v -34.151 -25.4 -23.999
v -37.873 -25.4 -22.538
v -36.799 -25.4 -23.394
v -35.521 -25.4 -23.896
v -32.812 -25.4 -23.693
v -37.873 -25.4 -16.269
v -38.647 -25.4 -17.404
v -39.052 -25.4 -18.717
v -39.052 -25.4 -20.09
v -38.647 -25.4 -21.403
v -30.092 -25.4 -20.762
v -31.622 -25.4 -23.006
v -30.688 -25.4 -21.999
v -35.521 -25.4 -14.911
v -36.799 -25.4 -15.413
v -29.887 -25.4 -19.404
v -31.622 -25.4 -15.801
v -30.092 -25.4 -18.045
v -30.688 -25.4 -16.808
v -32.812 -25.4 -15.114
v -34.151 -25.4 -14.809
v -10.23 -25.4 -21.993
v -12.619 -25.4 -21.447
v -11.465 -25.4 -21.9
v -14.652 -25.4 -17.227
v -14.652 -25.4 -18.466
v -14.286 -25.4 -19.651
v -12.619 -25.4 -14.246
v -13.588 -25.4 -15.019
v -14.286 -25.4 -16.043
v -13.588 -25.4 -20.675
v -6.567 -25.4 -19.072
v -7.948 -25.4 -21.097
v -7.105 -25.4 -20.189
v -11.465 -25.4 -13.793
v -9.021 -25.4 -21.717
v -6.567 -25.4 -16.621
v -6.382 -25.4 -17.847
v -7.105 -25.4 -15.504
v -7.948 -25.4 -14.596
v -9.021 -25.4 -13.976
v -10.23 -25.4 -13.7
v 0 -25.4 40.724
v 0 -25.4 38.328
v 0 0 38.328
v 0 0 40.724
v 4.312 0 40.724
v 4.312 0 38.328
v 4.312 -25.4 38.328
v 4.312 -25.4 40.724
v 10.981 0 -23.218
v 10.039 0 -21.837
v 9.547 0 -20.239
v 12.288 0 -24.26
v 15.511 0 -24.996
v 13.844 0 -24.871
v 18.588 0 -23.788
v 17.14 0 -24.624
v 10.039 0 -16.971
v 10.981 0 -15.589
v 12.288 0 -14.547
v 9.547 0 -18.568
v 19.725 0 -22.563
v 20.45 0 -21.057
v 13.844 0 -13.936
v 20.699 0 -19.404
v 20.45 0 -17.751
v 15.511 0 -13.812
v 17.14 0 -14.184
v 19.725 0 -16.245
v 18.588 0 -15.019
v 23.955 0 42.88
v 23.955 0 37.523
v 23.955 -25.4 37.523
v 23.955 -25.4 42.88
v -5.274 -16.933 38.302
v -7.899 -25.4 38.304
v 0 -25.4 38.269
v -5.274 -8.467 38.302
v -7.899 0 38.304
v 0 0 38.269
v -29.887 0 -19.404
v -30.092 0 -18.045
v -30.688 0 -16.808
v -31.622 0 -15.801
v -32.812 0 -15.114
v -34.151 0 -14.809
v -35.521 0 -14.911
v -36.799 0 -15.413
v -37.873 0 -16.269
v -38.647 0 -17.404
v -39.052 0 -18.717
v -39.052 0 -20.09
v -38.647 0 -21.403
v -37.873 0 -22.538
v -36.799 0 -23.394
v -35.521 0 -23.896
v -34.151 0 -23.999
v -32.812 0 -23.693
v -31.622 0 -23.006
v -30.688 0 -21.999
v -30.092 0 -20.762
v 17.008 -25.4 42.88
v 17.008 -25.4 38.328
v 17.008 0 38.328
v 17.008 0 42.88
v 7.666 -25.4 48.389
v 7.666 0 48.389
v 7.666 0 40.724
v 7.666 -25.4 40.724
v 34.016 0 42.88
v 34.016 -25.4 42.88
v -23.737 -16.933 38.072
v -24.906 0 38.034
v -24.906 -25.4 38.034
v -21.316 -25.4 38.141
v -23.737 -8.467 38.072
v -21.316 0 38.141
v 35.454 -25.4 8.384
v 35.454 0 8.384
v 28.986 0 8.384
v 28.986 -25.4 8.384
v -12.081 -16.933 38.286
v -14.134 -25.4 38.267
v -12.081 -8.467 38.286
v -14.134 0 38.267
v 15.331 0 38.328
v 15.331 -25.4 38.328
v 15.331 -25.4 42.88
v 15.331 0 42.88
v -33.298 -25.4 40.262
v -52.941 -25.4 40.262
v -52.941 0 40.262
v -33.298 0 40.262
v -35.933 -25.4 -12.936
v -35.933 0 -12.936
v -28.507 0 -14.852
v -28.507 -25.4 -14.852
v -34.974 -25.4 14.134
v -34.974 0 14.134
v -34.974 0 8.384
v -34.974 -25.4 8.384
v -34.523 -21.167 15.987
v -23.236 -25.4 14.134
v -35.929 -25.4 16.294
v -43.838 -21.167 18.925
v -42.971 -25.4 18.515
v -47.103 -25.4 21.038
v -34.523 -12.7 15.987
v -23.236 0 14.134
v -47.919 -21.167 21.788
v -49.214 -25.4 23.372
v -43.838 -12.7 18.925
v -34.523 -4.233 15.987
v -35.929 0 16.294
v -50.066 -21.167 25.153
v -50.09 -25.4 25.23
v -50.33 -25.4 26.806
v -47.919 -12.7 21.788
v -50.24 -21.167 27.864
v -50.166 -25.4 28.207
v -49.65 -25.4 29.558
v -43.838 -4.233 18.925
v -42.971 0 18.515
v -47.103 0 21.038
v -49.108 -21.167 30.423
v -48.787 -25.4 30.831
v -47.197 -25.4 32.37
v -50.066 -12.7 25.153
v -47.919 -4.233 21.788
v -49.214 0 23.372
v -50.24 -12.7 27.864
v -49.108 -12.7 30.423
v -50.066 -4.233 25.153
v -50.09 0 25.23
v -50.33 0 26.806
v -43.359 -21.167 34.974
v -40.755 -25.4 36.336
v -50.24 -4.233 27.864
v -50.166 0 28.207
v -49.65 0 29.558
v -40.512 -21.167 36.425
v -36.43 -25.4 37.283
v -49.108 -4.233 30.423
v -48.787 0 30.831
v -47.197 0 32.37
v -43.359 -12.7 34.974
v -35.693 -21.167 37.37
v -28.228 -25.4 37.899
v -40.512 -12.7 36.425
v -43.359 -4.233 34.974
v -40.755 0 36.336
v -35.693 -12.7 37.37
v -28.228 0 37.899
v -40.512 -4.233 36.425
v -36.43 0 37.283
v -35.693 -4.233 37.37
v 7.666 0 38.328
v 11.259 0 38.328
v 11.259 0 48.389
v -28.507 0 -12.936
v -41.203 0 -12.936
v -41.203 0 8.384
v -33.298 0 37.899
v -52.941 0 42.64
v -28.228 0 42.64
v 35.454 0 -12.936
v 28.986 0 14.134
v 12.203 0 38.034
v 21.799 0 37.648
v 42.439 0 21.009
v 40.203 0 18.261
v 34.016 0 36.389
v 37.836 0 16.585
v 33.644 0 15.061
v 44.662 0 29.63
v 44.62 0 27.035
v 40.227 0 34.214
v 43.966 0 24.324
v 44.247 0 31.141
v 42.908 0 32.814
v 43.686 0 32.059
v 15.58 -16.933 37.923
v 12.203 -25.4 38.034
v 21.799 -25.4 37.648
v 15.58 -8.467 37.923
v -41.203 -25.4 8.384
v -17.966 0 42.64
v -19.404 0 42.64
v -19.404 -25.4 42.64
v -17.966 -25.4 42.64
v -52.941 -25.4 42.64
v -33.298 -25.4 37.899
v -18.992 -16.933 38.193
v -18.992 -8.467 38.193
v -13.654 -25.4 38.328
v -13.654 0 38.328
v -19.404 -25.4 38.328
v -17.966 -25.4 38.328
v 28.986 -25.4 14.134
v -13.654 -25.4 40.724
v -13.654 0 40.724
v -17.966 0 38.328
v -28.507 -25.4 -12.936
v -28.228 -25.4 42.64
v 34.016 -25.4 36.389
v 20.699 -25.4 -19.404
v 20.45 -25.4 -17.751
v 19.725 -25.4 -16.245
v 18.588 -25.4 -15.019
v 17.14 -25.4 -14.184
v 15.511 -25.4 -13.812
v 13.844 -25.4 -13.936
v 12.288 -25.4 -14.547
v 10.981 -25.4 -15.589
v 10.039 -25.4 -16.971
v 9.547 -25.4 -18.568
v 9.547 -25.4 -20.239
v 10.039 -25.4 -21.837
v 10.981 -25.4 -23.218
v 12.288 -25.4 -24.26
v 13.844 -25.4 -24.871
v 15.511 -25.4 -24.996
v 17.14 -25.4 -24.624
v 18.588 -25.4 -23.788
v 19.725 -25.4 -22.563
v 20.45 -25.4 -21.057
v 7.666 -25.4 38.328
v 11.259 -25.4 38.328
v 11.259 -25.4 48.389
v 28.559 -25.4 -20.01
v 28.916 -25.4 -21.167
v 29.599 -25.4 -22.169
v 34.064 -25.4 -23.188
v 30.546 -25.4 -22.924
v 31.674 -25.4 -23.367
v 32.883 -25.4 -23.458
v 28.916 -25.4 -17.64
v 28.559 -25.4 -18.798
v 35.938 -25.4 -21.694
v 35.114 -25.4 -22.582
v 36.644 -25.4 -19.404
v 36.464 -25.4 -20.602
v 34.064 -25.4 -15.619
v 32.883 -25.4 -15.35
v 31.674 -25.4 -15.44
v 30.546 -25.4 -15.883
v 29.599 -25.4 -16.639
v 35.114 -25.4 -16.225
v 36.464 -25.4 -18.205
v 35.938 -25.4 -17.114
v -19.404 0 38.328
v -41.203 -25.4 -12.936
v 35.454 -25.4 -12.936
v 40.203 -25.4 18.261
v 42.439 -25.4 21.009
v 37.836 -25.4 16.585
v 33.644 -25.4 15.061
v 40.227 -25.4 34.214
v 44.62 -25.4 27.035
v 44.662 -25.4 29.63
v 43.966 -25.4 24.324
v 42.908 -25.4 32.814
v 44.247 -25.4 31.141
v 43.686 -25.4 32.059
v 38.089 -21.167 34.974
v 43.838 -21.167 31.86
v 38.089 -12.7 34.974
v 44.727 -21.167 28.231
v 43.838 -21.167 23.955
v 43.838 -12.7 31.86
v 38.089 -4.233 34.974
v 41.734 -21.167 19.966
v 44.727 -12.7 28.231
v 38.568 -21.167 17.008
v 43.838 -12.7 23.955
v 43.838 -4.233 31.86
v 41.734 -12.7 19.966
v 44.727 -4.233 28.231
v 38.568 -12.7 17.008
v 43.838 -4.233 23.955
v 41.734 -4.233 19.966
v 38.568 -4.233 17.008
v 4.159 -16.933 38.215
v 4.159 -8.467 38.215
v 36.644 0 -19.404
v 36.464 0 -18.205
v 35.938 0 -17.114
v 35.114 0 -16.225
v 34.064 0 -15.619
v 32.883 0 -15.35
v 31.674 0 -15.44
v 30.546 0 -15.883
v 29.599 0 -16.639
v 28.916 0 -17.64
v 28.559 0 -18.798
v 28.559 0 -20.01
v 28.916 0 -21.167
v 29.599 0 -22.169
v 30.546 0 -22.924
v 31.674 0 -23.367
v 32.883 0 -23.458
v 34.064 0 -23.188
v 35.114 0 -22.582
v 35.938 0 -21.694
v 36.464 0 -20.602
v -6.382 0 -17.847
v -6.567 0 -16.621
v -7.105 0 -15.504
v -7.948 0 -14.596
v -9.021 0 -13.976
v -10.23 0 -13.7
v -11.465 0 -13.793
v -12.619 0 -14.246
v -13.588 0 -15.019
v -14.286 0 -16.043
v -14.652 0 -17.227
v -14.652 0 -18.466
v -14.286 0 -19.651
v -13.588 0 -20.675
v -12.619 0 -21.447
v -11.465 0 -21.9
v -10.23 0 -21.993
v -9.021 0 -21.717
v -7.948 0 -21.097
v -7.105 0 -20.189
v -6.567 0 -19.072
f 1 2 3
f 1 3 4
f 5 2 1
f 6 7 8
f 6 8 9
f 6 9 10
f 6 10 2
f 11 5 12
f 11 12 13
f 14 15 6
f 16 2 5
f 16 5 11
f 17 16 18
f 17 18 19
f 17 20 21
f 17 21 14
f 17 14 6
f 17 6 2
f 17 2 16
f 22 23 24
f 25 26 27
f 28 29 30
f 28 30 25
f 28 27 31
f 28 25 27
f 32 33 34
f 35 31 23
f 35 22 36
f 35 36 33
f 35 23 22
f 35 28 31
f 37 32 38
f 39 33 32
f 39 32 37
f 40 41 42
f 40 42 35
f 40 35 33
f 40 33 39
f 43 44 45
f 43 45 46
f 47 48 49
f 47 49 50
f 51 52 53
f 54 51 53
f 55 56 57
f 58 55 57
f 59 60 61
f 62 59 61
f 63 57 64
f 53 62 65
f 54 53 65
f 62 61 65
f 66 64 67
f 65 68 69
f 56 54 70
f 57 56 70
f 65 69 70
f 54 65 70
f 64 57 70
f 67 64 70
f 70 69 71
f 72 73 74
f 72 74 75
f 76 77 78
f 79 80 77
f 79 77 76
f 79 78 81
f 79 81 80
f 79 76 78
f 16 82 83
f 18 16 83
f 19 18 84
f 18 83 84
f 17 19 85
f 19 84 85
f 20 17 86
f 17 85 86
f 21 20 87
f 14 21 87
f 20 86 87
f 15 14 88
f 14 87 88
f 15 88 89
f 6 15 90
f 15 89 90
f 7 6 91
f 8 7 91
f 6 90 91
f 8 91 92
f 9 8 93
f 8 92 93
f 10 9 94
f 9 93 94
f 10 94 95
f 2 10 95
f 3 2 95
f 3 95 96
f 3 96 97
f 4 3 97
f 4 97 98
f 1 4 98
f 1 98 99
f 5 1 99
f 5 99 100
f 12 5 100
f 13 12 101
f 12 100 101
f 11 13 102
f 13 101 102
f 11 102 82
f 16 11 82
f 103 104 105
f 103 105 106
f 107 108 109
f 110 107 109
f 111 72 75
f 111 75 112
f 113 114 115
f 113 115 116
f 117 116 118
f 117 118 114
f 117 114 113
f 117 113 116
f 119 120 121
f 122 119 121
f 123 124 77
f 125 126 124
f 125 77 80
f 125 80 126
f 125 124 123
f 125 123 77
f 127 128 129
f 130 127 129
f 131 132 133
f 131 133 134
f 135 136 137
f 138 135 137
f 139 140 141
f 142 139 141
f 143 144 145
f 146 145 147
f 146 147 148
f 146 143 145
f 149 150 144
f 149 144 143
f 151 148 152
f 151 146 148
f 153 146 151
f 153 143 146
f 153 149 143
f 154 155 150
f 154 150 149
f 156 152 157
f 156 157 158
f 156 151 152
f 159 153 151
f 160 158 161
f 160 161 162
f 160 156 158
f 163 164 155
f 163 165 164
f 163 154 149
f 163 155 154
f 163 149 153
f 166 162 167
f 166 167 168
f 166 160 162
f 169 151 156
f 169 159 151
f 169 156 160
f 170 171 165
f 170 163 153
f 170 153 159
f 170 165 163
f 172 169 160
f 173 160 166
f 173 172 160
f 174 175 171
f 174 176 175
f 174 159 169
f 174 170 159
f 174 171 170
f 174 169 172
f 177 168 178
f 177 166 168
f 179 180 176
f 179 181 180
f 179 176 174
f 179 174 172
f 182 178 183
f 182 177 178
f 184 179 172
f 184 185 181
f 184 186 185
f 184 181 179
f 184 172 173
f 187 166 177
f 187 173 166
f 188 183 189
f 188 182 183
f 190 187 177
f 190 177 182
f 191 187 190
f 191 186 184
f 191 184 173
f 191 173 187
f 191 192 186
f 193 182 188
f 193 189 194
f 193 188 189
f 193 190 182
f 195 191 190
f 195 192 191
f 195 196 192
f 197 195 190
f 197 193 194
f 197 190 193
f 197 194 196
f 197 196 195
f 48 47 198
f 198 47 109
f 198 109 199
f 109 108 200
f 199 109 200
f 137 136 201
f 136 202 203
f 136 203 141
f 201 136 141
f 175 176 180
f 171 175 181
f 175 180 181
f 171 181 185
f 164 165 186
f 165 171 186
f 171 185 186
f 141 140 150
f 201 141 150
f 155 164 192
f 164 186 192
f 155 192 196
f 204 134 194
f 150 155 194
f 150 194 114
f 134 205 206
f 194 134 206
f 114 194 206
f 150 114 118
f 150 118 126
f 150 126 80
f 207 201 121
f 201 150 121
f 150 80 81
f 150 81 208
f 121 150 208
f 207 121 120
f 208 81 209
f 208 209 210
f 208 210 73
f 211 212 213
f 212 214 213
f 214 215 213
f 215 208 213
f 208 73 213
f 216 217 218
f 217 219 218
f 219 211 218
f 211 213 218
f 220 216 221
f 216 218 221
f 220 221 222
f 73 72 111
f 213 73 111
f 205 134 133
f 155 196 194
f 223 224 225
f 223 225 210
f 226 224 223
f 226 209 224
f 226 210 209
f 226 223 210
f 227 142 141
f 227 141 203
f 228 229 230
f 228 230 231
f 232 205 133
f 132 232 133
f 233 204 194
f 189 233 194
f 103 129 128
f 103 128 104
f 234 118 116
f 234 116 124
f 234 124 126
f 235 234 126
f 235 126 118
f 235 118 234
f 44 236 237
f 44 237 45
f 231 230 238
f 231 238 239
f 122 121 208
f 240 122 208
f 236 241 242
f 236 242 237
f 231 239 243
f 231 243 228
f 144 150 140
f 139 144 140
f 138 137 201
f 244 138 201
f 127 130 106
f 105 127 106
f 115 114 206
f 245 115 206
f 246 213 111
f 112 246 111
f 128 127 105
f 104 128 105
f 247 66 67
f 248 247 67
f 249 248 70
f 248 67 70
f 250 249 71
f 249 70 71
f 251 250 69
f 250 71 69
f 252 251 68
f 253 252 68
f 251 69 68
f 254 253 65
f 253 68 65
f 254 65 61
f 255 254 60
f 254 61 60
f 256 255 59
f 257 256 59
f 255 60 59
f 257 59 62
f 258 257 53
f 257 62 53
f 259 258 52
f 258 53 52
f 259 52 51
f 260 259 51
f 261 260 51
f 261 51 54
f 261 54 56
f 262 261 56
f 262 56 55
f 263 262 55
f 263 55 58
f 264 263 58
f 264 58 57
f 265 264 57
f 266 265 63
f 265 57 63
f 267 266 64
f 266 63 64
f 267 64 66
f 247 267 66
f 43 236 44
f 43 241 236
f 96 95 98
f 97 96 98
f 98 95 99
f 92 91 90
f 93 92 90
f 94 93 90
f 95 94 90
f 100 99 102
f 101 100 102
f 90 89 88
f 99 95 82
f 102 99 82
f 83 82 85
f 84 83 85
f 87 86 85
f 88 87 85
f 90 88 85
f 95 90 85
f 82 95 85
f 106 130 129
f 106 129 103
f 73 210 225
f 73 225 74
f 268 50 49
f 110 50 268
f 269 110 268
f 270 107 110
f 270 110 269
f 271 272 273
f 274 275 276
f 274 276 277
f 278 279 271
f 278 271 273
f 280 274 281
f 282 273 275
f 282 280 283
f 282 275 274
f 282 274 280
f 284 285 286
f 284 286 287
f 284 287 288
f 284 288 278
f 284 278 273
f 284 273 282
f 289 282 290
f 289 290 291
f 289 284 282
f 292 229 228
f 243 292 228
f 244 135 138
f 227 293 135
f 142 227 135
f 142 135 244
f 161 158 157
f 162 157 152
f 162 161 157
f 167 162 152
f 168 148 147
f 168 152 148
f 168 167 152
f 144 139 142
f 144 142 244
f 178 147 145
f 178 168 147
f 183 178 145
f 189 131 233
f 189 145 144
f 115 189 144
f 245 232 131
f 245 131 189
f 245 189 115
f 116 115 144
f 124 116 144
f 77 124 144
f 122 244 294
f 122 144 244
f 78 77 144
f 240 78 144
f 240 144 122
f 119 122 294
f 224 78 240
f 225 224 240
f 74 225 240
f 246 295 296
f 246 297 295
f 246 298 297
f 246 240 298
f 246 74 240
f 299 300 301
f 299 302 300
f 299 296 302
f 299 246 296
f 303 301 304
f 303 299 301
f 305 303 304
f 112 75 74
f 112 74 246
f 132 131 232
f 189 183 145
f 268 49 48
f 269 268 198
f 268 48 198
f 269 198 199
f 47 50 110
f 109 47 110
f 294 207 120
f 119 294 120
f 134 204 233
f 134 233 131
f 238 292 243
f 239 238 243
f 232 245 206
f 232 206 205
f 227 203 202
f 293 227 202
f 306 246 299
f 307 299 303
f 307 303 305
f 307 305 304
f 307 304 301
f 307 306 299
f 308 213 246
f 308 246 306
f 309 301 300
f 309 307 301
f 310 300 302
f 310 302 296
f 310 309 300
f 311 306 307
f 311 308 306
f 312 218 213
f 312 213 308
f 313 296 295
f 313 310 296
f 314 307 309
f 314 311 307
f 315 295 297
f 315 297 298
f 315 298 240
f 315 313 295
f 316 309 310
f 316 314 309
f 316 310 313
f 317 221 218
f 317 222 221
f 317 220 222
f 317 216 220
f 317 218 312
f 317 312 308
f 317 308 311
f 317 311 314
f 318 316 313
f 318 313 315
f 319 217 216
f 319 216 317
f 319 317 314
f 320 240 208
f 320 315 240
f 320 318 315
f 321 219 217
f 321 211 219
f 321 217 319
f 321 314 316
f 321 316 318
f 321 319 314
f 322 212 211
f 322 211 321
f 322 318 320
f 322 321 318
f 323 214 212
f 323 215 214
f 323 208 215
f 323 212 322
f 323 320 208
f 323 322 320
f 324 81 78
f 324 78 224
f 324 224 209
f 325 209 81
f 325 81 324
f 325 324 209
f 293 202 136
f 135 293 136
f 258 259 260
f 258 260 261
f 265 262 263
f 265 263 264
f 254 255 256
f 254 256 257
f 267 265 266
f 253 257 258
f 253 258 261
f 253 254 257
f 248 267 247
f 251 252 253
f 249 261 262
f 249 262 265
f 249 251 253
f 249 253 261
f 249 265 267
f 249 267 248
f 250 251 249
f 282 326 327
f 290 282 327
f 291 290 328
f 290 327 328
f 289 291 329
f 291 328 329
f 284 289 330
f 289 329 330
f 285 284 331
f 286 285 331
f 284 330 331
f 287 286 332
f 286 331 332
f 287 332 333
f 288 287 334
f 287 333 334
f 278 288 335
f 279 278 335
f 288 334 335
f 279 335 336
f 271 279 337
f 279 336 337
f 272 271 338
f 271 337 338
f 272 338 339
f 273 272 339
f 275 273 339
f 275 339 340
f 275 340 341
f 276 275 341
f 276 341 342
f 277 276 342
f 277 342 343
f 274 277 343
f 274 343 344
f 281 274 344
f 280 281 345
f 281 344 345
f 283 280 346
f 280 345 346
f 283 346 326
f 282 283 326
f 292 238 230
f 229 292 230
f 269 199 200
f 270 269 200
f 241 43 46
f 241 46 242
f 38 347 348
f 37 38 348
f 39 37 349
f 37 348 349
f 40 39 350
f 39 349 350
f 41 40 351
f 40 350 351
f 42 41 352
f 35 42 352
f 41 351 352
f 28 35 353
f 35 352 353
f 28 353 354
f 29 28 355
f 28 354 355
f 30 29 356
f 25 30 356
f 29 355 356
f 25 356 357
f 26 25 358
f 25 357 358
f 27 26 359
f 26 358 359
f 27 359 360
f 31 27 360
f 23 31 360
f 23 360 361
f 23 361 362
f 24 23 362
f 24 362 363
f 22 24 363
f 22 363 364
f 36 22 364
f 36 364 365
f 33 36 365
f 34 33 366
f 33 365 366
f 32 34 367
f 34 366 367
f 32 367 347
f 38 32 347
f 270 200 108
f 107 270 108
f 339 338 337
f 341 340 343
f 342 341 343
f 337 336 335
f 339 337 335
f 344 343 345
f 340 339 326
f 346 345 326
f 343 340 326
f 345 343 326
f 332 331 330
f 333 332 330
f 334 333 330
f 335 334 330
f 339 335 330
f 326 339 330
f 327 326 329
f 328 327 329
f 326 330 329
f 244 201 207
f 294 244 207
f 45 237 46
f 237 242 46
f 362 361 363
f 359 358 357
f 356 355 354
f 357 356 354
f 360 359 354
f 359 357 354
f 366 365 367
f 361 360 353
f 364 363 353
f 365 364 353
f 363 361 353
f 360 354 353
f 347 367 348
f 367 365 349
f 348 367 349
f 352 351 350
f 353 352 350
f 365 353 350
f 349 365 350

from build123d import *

# Parameters (mm, degrees)
F0_W     = 5.0702048653
F0_H     = 2.3622762329
F1_DEPTH = 25.4
F0_R     = 4.6078543136
F0_R_2   = 4.1577773218
F0_R_3   = 5.6077425758
F0_R_4   = 4.0653177371
F3_DEPTH = 25.4
F2_W     = 1.4373064041
F2_H     = 4.3119154871
F2_W_2   = 3.3537149429
F2_H_2   = 2.3955106735
F2_W_3   = 10.0611355156
F2_H_3   = 6.7074261606
F2_W_4   = 1.6768574715
F2_H_4   = 4.5514665544


with BuildPart() as f1:
    # F0 (on Front) → F1 (new body)
    with BuildSketch(Plane.XZ):
        Polygon((28.9856605232, -12.9357483238), (35.4535356164, -12.9357483238), (35.4535356164, 8.3842817694), (28.9856605232, 8.3842817694), (-34.9744297564, 8.3842817694), (-41.2027537823, 8.3842817694), (-41.2027537823, -12.9357483238), (-35.9326340258, -12.9357483238), (-28.5065565258, -12.9357483238), (-14.6126048639, -12.9357483238), (-6.4678736962, -12.9357483238), (9.8215863109, -12.9357483238), (19.4036252797, -12.9357483238), align=None)
        Polygon((-34.9744297564, 8.3842817694), (28.9856605232, 8.3842817694), (28.9856605232, 14.1335036606), (-23.2364367694, 14.1335036606), (-34.9744297564, 14.1335036606), align=None)
        with BuildLine():
            Line((-23.2364367694, 14.1335036606), (28.9856605232, 14.1335036606))
            add(Edge.make_bspline(
                [(21.7991303653, 37.6480714586), (25.6450727863, 37.4416232789), (34.6809133054, 36.7330473424), (37.0927539509, 35.0331252242), (45.5422763301, 32.8451114125), (44.452312866, 23.3823811536), (39.1621048566, 15.9129440703), (32.4545711571, 14.7400730632), (28.9856605232, 14.1335036606)],
                knots=[0.585293099, 0.585293099, 0.585293099, 0.585293099, 0.6248367621, 0.6959160319, 0.7636209053, 0.8380663016, 0.9162533423, 1, 1, 1, 1], degree=3))
            add(Edge.make_bspline(
                [(12.2025949201, 38.0339011156), (15.6521480295, 37.9326505565), (18.9005752843, 37.803664381), (21.7991303653, 37.6480714586)],
                knots=[0.5554903944, 0.5554903944, 0.5554903944, 0.5554903944, 0.585293099, 0.585293099, 0.585293099, 0.585293099], degree=3))
            add(Edge.make_bspline(
                [(0, 38.2687912792), (4.1809466223, 38.2267187557), (8.3192182558, 38.1478851726), (12.2025949201, 38.0339011156)],
                knots=[0.5219396348, 0.5219396348, 0.5219396348, 0.5219396348, 0.5554903944, 0.5554903944, 0.5554903944, 0.5554903944], degree=3))
            add(Edge.make_bspline(
                [(-7.8992090494, 38.3041348545), (-5.2845734446, 38.3072105896), (-2.6338190113, 38.2952951843), (0, 38.2687912792)],
                knots=[0.5008040794, 0.5008040794, 0.5008040794, 0.5008040794, 0.5219396348, 0.5219396348, 0.5219396348, 0.5219396348], degree=3))
            add(Edge.make_bspline(
                [(-14.1335027292, 38.2671583871), (-12.0975615779, 38.289396776), (-10.0101569366, 38.3016516341), (-7.8992090494, 38.3041348545)],
                knots=[0.4837401124, 0.4837401124, 0.4837401124, 0.4837401124, 0.5008040794, 0.5008040794, 0.5008040794, 0.5008040794], degree=3))
            add(Edge.make_bspline(
                [(-21.316305856, 38.1405074727), (-19.0328736954, 38.1978928782), (-16.621619078, 38.2399809321), (-14.1335027292, 38.2671583871)],
                knots=[0.4628862997, 0.4628862997, 0.4628862997, 0.4628862997, 0.4837401124, 0.4837401124, 0.4837401124, 0.4837401124], degree=3))
            add(Edge.make_bspline(
                [(-24.9057131658, 38.0337493601), (-23.7521320973, 38.0738631863), (-22.5529646355, 38.1094287454), (-21.316305856, 38.1405074727)],
                knots=[0.4515923138, 0.4515923138, 0.4515923138, 0.4515923138, 0.4628862997, 0.4628862997, 0.4628862997, 0.4628862997], degree=3))
            add(Edge.make_bspline(
                [(-28.228171762, 37.8993945294), (-27.1718919643, 37.9487878685), (-26.0616905562, 37.9935522058), (-24.9057131658, 38.0337493601)],
                knots=[0.4402748671, 0.4402748671, 0.4402748671, 0.4402748671, 0.4515923138, 0.4515923138, 0.4515923138, 0.4515923138], degree=3))
            add(Edge.make_bspline(
                [(-23.2364367694, 14.1335036606), (-30.9795679414, 15.2487990388), (-43.7195091698, 17.0838186524), (-51.06587186, 24.5887448025), (-49.8879616394, 30.9822534776), (-42.5567409599, 35.4681098428), (-39.7504179111, 37.1701302775), (-31.2057923008, 37.7601562125), (-28.228171762, 37.8993945294)],
                knots=[0, 0, 0, 0, 0.1217723951, 0.2003547561, 0.2616353983, 0.3333348397, 0.4083713298, 0.4402748671, 0.4402748671, 0.4402748671, 0.4402748671], degree=3))
        make_face()
        with BuildLine():
            Line((-28.228171762, 40.2616707623), (-28.228171762, 37.8993945294))
            add(Edge.make_bspline(
                [(-28.228171762, 37.8993945294), (-27.1718919643, 37.9487878685), (-26.0616905562, 37.9935522058), (-24.9057131658, 38.0337493601)],
                knots=[0.4402748671, 0.4402748671, 0.4402748671, 0.4402748671, 0.4515923138, 0.4515923138, 0.4515923138, 0.4515923138], degree=3))
            Line((-24.9057131658, 38.0337493601), (-28.228171762, 40.2616707623))
        make_face()
        with Locations((-30.7632741947, 39.0805326458)):
            Rectangle(F0_W, F0_H)
        Polygon((-28.5065565258, -14.8521559313), (-28.5065565258, -12.9357483238), (-35.9326340258, -12.9357483238), align=None)
        Polygon((-28.228171762, 40.2616707623), (-24.9057131658, 38.0337493601), (-28.228171762, 42.6400601864), align=None)
        Polygon((-33.2983766273, 40.2616707623), (-28.228171762, 40.2616707623), (-28.228171762, 42.6400601864), (-52.940748632, 42.6400601864), (-52.940748632, 40.2616707623), align=None)
    extrude(amount=F1_DEPTH)

    # F2 (on Front) → F3, piece 4 (join)
    with BuildSketch(Plane.XZ):
        with Locations((28.9856577292, 39.5258981735)):
            Rectangle(F2_W_3, F2_H_3)
    extrude(amount=F3_DEPTH)


with BuildPart() as f1b:
    # F0 (on Front) → F1, piece 2 (new body)
    with BuildSketch(Plane.XZ):
        with Locations((-34.4953276217, -19.403623417)):
            Circle(F0_R)
    extrude(amount=F1_DEPTH)


with BuildPart() as f1c:
    # F0 (on Front) → F1, piece 3 (new body)
    with BuildSketch(Plane.XZ):
        with Locations((-10.5402404442, -17.8465414792)):
            Circle(F0_R_2)
    extrude(amount=F1_DEPTH)


with BuildPart() as f1d:
    # F0 (on Front) → F1, piece 4 (new body)
    with BuildSketch(Plane.XZ):
        with Locations((15.0917060673, -19.403623417)):
            Circle(F0_R_3)
    extrude(amount=F1_DEPTH)


with BuildPart() as f1e:
    # F0 (on Front) → F1, piece 5 (new body)
    with BuildSketch(Plane.XZ):
        with Locations((32.5789265335, -19.403623417)):
            Circle(F0_R_4)
    extrude(amount=F1_DEPTH)


with BuildPart() as f3:
    # F2 (on Front) → F3 (new body)
    with BuildSketch(Plane.XZ):
        Polygon((-13.6544015259, 38.3281446993), (-12.2170960531, 38.3281446993), (0, 38.3281446993), (0, 40.7236553729), (-13.6544015259, 40.7236553729), align=None)
    extrude(amount=F3_DEPTH)


with BuildPart() as f3b:
    # F2 (on Front) → F3, piece 2 (new body)
    with BuildSketch(Plane.XZ):
        with Locations((-18.684970215, 40.4841024429)):
            Rectangle(F2_W, F2_H)
    extrude(amount=F3_DEPTH)


with BuildPart() as f3c:
    # F2 (on Front) → F3, piece 3 (new body)
    with BuildSketch(Plane.XZ):
        with Locations((5.9887710959, 39.5259000361)):
            Rectangle(F2_W_2, F2_H_2)
        Polygon((7.6656285673, 40.7236553729), (7.6656285673, 38.3281446993), (11.2588936463, 38.3281446993), (11.2588936463, 48.3892783523), (7.6656285673, 48.3892783523), align=None)
    extrude(amount=F3_DEPTH)


with BuildPart() as f3d:
    # F2 (on Front) → F3, piece 5 (new body)
    with BuildSketch(Plane.XZ):
        with Locations((16.1696858704, 40.6038779765)):
            Rectangle(F2_W_4, F2_H_4)
    extrude(amount=F3_DEPTH)


solid = Compound([f1.part, f1b.part, f1c.part, f1d.part, f1e.part, f3.part, f3b.part, f3c.part, f3d.part])
